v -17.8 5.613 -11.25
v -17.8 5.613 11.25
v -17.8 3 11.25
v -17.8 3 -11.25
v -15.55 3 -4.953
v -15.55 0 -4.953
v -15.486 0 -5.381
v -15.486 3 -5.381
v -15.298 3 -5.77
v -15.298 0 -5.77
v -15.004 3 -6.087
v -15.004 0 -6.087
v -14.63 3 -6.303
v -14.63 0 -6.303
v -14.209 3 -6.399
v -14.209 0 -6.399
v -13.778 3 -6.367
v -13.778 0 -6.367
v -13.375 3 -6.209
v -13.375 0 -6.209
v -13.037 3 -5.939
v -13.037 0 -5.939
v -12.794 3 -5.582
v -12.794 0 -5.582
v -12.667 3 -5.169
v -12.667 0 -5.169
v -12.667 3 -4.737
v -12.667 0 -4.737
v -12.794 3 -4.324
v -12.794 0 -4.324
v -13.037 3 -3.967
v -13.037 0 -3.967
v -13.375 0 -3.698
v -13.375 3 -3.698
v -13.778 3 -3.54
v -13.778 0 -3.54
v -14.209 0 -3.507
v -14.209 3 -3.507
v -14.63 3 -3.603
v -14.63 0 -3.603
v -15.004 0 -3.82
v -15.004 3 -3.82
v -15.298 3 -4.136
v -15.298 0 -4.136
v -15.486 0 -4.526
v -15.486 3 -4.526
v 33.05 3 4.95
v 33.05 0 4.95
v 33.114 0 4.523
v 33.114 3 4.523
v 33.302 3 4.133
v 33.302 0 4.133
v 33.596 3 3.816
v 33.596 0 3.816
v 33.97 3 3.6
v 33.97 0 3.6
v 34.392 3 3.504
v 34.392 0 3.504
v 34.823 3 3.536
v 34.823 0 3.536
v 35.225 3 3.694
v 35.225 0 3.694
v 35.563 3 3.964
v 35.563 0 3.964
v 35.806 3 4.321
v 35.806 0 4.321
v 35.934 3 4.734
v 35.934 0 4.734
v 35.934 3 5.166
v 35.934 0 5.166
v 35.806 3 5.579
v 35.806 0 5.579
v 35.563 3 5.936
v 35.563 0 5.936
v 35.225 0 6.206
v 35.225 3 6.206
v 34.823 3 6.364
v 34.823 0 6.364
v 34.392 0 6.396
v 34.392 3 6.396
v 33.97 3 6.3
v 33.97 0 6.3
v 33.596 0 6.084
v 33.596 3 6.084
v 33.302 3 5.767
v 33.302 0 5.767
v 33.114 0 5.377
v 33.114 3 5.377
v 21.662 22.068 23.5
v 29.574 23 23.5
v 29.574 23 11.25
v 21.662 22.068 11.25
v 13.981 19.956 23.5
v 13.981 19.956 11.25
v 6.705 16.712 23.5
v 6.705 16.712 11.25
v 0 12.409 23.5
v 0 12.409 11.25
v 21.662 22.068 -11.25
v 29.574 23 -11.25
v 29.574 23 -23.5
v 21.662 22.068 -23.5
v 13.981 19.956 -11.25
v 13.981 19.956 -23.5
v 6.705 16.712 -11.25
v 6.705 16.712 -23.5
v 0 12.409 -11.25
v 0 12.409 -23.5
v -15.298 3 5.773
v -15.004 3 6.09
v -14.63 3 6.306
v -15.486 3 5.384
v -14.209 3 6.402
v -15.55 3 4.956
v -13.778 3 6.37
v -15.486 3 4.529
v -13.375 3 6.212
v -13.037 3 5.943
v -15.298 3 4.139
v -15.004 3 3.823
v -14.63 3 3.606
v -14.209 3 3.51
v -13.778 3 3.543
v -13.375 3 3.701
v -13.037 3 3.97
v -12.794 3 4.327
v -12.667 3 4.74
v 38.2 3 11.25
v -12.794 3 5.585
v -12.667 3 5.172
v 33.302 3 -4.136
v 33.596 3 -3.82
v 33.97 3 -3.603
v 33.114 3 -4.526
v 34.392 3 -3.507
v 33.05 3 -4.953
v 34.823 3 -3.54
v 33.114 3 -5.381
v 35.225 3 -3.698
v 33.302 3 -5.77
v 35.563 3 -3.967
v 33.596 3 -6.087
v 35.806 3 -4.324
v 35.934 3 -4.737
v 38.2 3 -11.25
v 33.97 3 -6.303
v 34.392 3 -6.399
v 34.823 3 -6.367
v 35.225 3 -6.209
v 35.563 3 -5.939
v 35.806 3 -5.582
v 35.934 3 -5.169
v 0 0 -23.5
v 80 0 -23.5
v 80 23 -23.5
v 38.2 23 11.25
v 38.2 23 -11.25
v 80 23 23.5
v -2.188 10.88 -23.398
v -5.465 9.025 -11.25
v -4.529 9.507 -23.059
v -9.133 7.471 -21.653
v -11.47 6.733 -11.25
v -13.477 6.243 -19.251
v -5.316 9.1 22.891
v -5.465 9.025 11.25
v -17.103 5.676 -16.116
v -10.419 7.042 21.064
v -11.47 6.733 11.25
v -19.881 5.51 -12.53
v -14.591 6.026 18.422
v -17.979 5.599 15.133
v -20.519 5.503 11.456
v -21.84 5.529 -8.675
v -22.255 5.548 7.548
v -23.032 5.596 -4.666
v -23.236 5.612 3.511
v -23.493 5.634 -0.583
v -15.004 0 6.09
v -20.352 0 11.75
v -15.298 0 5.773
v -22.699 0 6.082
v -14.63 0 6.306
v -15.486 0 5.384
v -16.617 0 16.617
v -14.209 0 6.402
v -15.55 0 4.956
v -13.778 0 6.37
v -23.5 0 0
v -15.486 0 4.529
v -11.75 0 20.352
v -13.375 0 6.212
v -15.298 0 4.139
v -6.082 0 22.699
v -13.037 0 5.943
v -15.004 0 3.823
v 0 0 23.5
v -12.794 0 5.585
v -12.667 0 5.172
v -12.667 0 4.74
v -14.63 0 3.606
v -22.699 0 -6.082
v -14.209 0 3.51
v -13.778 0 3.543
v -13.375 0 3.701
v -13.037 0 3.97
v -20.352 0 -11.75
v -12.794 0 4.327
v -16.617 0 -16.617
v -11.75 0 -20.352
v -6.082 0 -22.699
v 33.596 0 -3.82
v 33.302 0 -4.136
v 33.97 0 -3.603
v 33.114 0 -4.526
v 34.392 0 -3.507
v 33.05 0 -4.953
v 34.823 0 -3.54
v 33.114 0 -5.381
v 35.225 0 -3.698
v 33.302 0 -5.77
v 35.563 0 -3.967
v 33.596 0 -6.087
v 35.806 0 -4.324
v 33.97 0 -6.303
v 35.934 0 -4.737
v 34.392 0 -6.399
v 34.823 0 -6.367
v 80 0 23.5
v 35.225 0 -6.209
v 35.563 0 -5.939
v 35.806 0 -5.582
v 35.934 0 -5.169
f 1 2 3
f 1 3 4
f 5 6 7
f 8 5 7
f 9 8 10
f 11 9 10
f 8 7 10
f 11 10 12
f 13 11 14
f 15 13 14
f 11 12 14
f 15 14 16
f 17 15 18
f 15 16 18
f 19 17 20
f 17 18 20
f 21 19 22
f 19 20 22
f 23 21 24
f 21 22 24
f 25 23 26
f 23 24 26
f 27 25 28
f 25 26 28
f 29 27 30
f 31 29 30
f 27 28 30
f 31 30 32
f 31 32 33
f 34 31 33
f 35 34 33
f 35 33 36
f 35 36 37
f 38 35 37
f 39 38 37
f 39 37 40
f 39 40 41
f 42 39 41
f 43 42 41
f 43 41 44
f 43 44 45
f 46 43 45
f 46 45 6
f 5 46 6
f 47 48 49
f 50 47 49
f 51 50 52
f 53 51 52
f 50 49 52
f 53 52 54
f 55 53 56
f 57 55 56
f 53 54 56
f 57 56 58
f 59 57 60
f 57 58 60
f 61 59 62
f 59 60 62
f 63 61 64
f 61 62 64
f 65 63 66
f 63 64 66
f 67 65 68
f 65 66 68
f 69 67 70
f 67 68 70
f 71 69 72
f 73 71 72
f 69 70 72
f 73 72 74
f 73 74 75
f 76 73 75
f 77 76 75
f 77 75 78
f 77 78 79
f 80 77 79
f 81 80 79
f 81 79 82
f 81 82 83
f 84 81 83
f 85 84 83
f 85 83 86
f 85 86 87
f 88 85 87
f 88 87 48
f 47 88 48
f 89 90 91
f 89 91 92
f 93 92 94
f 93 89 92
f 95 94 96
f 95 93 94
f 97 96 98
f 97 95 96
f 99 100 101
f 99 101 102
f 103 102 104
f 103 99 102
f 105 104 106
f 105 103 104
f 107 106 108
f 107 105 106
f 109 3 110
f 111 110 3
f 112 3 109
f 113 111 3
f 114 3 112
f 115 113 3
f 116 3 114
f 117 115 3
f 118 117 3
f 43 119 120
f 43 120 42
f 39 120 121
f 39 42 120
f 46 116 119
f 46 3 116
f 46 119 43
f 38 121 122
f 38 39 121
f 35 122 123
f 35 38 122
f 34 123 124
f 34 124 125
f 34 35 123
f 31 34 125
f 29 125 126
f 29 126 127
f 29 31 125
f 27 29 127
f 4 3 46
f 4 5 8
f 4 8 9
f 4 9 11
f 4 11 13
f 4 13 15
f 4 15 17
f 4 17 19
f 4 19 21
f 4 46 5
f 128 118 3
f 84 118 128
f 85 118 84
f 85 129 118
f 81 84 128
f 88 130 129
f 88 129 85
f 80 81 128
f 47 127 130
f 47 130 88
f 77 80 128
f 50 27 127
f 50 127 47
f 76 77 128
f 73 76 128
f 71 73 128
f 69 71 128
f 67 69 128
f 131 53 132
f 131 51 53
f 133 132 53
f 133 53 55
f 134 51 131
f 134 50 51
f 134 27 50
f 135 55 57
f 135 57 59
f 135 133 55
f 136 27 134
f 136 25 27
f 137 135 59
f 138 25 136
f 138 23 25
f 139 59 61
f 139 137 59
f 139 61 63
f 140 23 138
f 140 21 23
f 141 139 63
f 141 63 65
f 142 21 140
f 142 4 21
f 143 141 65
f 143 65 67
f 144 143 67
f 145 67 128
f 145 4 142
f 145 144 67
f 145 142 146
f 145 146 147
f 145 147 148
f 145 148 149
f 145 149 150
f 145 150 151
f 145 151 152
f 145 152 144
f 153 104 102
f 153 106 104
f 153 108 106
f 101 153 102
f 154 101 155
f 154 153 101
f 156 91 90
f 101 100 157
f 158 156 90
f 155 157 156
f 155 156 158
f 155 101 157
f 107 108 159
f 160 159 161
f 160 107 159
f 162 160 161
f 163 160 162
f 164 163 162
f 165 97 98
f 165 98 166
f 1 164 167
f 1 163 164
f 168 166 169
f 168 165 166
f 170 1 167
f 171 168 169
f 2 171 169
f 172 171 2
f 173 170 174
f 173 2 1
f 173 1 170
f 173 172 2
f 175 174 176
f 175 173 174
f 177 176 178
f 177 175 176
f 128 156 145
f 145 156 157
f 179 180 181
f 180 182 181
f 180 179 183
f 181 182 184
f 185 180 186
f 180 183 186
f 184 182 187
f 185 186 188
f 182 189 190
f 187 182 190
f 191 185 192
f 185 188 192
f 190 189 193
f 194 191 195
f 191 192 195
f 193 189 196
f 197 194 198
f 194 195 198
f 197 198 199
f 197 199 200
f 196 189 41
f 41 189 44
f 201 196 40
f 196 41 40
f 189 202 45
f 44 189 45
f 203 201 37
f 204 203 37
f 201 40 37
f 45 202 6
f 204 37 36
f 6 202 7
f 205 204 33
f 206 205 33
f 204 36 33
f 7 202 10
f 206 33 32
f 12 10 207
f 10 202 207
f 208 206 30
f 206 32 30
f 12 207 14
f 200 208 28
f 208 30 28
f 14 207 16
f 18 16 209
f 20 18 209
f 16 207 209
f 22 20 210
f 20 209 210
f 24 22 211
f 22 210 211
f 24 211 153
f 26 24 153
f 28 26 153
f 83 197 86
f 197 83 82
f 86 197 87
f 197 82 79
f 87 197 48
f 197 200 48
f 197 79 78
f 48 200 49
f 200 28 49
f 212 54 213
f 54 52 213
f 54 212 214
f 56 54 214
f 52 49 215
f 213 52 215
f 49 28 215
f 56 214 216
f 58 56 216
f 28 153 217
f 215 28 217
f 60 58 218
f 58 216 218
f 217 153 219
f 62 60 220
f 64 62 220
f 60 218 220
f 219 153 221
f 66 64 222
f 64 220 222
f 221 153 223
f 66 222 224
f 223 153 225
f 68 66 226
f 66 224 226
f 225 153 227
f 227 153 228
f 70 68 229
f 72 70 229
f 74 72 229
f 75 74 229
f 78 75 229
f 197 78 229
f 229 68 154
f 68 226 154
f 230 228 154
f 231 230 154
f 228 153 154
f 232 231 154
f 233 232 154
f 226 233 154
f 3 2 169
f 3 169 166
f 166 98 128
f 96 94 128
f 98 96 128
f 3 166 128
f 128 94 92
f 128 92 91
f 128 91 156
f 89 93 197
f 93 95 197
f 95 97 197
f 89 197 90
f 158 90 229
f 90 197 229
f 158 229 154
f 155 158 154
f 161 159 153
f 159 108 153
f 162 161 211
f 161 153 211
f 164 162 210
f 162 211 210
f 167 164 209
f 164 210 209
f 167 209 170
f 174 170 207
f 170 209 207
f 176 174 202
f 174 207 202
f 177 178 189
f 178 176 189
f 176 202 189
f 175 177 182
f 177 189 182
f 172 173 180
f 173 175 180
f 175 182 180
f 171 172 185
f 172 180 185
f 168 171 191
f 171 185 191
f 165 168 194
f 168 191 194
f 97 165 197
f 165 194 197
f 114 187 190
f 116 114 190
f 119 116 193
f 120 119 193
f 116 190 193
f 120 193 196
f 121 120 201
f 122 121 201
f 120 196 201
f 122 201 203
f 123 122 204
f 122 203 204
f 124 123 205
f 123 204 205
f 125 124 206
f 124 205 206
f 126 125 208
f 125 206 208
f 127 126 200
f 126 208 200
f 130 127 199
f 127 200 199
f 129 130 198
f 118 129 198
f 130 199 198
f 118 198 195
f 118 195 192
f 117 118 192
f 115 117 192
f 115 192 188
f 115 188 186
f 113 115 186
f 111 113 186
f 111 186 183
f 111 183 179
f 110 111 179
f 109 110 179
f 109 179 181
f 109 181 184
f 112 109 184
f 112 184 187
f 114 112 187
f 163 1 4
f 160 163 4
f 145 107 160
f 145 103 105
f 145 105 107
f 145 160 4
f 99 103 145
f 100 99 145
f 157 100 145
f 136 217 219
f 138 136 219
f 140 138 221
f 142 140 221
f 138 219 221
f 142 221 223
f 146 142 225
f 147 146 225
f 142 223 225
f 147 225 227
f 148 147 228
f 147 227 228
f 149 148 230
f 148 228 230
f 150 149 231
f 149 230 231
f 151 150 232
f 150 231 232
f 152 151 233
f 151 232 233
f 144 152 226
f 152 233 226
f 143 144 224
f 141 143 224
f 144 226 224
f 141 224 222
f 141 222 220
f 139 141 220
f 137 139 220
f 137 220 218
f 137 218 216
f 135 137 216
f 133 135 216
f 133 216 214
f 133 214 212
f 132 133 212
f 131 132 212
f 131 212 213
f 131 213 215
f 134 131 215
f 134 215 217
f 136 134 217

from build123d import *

# Parameters (mm, degrees)
SKETCH1_R               = 23.5
SKETCH1_W               = 80
SKETCH1_H               = 47
BOSS_EXTRUDE1_DEPTH     = 23
SKETCH3_W               = 56
SKETCH3_H               = 22.5
CUT_EXTRUDE1_DEPTH      = 20
CUT_EXTRUDE2_DEPTH      = 48
M3_5X0_6_TAPPED_HOLE1_D = 2.9


with BuildPart() as part:
    # Sketch1 → Boss-Extrude1 (new body)
    with BuildSketch(Plane(origin=(0, 0, 0), x_dir=(1, 0, 0), z_dir=(0, 1, 0))):
        Circle(SKETCH1_R)
        with Locations((40, 0)):
            Rectangle(SKETCH1_W, SKETCH1_H)
    extrude(amount=BOSS_EXTRUDE1_DEPTH)

    # Sketch3 → Cut-Extrude1 (cut)
    with BuildSketch(Plane(origin=(0, 23, 0), x_dir=(1, 0, 0), z_dir=(0, 1, 0))):
        with Locations((10.2, 0)):
            Rectangle(SKETCH3_W, SKETCH3_H)
    extrude(amount=-CUT_EXTRUDE1_DEPTH, mode=Mode.SUBTRACT)

    # Sketch4 → Cut-Extrude2 (cut, through all)
    with BuildSketch(Plane.XY.offset(23.5)):
        with BuildLine():
            Line((0, 23), (29.574214856, 23))
            ThreePointArc((29.574214856, 23), (13.980947767, 19.955758133), (0, 12.409203517))
            ThreePointArc((0, 12.409203517), (-11.118700592, 6.831963759), (-23.5, 5.634244617))
            Line((-23.5, 5.634244617), (-23.5, 23))
            Line((-23.5, 23), (0, 23))
        make_face()
    extrude(amount=-CUT_EXTRUDE2_DEPTH, mode=Mode.SUBTRACT)

    # M3.5x0.6 Tapped Hole1 (through all)
    with Locations(Plane(origin=(0, 3, 0), x_dir=(1, 0, 0), z_dir=(0, 1, 0))):
        with Locations((-14.100375238, 4.953237367), (-14.100375238, -4.956255047), (34.5, -4.95), (34.5, 4.953237367)):
            Hole(M3_5X0_6_TAPPED_HOLE1_D / 2)


solid = part.part
